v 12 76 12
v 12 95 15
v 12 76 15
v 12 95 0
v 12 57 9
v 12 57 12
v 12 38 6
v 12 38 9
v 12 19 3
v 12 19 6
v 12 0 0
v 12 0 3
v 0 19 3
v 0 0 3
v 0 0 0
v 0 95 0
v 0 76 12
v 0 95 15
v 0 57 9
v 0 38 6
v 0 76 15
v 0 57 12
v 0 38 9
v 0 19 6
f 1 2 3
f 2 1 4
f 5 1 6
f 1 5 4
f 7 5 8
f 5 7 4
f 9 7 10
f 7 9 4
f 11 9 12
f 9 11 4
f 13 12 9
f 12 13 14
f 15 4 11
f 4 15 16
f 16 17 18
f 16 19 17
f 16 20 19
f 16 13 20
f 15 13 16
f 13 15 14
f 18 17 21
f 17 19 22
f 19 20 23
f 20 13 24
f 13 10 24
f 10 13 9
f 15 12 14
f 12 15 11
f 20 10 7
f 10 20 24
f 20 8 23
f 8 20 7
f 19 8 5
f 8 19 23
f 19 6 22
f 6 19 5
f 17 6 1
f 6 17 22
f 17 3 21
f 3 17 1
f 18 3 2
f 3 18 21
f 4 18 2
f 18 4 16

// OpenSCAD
NumberofSteps = 5;
WidthofStep = 12;
DepthofStep = 19;
HeightofStep =3;

for(Step = [1:NumberofSteps])
{
translate([0,DepthofStep*(Step-1),0])
cube([WidthofStep,DepthofStep,HeightofStep*Step]);
} 
